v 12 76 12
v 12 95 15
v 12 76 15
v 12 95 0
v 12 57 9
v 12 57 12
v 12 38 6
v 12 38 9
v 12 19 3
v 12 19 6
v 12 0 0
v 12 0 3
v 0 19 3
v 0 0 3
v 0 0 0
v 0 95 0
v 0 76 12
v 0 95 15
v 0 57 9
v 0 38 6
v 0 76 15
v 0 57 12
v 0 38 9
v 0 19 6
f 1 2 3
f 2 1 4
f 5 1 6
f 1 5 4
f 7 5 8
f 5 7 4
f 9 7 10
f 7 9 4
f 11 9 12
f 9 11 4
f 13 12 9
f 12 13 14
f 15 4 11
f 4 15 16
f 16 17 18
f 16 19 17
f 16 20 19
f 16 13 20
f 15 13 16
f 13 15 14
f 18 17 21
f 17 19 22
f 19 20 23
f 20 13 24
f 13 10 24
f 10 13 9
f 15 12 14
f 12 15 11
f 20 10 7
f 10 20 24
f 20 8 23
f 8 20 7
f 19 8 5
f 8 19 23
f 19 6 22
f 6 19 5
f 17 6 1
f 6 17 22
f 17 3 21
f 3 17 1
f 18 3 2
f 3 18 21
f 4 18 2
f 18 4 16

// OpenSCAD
NumberofSteps = 5;
WidthofStep = 12;
DepthofStep = 19;
HeightofStep =3;

for(Step = [1:NumberofSteps])
{
translate([0,DepthofStep*(Step-1),0])
cube([WidthofStep,DepthofStep,HeightofStep*Step]);
} 
